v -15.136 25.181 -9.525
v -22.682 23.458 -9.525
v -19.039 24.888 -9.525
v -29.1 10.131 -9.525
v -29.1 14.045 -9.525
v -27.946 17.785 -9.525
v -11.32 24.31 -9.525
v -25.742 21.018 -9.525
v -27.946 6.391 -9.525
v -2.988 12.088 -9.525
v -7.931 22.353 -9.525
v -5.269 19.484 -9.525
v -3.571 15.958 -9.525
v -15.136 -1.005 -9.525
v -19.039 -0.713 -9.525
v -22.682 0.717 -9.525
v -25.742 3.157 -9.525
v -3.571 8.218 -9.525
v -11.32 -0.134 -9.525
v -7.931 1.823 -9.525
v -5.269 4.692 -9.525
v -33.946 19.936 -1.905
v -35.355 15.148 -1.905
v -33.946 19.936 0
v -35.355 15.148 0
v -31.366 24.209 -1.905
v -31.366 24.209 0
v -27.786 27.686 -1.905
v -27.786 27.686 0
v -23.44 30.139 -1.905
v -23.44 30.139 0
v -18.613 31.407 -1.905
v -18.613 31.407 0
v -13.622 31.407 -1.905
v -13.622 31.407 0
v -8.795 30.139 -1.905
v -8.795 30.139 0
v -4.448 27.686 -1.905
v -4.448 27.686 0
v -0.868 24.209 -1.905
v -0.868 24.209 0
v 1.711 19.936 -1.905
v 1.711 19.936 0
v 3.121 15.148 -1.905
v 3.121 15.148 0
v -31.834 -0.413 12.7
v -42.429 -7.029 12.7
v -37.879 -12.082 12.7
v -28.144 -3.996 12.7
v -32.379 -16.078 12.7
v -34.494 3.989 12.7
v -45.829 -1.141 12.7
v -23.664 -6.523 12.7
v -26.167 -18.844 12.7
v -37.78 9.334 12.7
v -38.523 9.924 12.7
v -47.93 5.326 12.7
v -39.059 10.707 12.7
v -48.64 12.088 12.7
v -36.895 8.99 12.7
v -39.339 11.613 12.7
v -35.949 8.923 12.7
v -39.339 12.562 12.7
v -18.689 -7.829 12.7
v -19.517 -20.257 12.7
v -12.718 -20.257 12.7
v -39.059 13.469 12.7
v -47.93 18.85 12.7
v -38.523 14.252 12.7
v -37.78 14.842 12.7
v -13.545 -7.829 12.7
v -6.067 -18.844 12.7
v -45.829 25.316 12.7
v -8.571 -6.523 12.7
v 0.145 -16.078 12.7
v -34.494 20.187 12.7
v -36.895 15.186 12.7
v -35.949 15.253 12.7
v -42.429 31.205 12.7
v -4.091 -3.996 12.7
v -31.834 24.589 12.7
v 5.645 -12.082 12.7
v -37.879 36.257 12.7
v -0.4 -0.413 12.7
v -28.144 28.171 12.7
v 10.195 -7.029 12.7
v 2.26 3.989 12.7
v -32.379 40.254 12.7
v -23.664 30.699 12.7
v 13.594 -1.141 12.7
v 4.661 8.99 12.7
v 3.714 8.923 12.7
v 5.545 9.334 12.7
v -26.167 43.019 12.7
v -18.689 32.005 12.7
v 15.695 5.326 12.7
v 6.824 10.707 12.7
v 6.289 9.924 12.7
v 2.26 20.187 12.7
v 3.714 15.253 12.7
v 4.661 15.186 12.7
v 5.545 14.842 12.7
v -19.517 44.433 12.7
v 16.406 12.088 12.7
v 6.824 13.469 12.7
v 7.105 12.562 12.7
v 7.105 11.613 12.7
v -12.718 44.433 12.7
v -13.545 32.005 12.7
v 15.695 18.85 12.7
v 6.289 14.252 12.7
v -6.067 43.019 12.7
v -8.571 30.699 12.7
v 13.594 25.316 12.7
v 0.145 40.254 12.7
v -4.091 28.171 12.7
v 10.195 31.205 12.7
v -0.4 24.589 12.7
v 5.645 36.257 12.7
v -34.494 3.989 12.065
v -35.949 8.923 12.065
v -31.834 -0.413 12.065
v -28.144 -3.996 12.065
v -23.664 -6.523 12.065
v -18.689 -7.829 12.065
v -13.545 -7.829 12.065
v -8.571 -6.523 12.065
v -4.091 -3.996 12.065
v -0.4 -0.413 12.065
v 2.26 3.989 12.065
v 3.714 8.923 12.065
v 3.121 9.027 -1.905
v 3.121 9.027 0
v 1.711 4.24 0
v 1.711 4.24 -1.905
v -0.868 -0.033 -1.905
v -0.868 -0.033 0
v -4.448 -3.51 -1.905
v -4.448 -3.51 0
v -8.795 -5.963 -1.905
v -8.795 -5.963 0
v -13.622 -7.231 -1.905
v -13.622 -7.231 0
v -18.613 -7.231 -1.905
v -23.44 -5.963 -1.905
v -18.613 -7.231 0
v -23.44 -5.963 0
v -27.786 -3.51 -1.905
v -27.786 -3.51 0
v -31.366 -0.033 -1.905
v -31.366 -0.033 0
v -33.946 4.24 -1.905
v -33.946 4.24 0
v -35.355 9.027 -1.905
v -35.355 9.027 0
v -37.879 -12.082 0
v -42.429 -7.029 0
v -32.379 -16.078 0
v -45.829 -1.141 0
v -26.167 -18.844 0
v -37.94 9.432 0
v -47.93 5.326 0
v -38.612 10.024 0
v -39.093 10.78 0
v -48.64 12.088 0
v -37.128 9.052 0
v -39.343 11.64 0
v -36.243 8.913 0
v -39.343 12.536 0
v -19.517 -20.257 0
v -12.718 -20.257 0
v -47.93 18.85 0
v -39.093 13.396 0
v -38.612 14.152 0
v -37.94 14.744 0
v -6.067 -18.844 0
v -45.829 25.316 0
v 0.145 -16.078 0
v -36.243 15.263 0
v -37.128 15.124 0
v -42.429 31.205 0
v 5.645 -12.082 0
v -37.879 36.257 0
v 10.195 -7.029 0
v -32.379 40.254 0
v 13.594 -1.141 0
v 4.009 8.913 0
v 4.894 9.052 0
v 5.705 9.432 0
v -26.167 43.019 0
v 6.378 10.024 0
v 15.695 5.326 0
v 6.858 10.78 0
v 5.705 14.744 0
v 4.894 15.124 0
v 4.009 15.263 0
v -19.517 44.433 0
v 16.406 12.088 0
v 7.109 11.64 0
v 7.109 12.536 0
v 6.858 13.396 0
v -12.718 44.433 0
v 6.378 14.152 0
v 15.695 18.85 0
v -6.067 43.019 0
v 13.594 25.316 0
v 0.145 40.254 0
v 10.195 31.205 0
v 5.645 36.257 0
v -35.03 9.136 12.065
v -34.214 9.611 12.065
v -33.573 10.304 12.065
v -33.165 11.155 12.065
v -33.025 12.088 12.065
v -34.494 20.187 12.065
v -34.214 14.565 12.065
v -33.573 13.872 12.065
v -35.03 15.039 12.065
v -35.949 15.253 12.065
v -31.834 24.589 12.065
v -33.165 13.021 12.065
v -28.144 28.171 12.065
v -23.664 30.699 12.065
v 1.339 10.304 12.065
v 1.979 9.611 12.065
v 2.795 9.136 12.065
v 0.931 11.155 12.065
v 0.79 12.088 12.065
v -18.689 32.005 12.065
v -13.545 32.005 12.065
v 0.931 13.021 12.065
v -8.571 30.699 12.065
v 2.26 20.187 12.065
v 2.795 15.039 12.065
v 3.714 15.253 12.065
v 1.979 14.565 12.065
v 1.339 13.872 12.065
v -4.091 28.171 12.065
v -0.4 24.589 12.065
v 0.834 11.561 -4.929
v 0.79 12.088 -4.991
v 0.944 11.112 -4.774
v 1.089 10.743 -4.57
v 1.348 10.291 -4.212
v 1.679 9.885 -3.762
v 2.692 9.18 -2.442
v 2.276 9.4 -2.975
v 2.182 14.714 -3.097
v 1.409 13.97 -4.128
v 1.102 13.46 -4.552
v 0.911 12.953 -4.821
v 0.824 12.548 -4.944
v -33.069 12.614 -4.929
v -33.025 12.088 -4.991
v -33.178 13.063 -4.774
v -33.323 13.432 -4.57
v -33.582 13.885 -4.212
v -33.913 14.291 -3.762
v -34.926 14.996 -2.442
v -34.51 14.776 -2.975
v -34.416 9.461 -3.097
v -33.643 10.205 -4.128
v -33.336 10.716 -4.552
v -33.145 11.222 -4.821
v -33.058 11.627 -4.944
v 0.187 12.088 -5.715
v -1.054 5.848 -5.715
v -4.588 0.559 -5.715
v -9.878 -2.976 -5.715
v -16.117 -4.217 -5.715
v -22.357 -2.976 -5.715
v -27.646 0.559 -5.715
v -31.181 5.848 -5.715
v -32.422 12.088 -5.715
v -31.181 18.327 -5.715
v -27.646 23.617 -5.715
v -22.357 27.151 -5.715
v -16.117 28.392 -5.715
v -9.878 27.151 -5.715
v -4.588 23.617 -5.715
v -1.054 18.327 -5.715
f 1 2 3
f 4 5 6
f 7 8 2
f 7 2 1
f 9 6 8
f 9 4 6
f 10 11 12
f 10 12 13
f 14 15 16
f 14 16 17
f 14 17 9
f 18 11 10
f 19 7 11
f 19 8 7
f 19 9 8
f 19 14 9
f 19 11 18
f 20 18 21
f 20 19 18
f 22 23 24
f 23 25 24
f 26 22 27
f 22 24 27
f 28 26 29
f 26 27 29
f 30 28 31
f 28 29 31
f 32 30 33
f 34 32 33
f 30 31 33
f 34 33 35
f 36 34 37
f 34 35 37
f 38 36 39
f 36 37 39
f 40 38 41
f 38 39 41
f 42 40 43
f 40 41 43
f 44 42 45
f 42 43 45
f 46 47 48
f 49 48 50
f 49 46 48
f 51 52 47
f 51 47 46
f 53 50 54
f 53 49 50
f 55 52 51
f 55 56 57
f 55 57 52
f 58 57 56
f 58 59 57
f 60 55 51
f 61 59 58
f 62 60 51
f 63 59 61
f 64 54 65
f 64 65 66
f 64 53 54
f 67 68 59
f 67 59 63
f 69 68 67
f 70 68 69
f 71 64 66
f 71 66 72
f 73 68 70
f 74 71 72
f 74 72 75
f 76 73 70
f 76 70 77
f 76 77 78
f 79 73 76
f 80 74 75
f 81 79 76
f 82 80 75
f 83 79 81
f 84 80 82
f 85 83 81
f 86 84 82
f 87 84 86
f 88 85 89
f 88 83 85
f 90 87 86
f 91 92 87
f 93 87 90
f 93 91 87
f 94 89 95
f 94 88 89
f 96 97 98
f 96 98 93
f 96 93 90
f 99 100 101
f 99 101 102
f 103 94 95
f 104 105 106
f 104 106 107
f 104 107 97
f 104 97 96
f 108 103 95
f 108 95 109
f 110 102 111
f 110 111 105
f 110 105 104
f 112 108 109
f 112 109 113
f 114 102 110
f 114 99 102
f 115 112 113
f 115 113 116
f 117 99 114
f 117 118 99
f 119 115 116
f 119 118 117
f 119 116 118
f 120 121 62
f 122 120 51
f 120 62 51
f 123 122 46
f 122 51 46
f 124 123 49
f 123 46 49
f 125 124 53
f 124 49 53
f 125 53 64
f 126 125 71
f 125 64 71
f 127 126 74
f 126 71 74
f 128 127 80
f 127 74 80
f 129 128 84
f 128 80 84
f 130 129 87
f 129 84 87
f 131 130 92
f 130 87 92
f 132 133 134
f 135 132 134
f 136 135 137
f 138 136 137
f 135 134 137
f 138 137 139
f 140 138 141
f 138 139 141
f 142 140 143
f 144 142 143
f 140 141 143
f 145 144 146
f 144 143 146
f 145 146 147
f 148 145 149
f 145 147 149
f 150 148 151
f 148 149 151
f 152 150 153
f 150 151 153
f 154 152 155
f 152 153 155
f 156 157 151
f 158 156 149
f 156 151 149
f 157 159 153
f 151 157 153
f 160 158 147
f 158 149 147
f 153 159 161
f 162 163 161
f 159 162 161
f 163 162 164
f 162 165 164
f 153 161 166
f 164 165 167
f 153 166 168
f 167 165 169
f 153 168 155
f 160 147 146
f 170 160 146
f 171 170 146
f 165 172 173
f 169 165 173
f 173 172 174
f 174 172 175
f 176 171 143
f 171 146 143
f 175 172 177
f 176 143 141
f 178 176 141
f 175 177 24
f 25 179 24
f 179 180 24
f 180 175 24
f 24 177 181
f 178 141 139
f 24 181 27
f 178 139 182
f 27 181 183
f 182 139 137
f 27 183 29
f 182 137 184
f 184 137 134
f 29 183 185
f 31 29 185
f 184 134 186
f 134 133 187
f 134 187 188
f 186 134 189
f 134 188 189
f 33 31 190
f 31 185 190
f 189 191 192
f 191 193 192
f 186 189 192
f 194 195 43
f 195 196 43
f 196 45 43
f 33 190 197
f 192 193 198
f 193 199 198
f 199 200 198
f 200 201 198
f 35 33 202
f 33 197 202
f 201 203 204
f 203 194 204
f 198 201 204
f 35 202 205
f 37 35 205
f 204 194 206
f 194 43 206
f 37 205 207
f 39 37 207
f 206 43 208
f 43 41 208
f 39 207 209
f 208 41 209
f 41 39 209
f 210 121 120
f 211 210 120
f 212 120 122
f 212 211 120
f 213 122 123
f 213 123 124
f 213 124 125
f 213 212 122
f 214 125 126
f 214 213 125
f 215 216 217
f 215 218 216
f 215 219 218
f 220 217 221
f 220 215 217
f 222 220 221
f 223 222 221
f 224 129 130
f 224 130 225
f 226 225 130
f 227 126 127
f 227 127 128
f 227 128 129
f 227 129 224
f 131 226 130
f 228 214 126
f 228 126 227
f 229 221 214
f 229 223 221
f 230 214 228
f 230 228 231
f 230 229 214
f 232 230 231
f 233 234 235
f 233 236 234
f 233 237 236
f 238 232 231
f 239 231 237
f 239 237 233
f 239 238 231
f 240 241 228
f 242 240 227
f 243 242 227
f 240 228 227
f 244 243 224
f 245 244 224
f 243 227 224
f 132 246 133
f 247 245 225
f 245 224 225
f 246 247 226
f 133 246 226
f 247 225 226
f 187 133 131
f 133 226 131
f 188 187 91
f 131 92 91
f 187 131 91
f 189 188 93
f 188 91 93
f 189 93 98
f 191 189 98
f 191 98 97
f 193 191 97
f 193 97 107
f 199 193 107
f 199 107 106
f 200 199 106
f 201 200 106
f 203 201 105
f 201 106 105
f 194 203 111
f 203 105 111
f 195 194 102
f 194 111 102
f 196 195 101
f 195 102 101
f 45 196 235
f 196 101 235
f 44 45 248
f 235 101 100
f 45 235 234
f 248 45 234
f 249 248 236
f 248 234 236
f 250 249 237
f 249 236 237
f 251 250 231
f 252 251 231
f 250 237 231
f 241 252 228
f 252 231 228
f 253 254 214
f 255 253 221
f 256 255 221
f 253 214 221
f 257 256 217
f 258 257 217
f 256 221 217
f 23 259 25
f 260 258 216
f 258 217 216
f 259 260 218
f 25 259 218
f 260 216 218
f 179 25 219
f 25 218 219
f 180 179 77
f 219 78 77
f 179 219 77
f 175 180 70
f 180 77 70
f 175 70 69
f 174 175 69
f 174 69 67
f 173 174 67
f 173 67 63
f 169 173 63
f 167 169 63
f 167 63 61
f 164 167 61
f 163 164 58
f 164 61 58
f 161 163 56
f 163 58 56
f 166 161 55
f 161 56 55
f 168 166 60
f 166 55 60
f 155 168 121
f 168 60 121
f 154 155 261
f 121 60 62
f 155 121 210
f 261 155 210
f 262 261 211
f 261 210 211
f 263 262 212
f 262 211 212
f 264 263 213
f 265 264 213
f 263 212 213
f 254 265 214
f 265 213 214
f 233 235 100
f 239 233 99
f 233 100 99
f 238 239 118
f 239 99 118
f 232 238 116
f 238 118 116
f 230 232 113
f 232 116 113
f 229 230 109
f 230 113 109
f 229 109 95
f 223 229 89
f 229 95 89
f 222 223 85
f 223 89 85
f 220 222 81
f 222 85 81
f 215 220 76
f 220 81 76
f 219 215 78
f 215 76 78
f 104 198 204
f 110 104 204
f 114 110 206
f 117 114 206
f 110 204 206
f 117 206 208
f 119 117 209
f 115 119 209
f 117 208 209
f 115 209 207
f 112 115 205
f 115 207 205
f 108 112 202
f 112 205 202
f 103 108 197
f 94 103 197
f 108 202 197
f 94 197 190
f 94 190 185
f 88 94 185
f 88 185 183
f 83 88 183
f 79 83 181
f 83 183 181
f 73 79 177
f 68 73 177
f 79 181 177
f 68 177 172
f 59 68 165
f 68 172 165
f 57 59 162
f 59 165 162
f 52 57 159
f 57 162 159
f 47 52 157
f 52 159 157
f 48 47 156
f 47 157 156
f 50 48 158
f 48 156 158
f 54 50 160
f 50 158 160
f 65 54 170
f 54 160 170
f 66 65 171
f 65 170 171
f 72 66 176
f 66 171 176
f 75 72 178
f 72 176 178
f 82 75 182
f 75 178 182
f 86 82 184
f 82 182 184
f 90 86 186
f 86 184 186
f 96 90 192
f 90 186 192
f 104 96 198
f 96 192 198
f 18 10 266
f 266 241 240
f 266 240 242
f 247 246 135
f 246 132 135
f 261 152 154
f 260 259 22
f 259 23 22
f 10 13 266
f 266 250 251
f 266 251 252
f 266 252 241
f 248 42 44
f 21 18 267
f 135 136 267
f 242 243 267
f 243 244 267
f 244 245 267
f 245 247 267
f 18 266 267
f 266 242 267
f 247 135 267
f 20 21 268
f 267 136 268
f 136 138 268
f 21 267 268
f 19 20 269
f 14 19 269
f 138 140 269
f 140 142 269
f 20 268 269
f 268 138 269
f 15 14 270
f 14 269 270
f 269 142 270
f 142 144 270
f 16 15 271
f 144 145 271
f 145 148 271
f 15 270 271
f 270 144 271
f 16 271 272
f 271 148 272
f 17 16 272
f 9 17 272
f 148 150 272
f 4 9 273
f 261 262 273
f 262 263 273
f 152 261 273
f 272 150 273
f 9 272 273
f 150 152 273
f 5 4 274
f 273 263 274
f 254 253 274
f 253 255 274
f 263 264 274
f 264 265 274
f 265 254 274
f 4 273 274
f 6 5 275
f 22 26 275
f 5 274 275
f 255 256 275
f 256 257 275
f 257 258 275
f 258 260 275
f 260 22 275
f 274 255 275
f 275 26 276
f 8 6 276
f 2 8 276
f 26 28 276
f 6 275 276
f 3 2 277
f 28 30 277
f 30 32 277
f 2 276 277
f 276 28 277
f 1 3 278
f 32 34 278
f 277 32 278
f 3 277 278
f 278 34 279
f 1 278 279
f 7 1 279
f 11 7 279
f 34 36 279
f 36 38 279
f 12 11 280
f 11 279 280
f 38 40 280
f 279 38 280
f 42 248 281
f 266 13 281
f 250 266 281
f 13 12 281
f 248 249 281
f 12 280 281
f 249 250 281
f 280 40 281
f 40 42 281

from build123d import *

# Parameters (mm, degrees)
F0_R     = 32.5233232703
F1_DEPTH = 12.7
F2_R     = 19.4795835543
F3_DEPTH = 9.525
F4_SIZE2 = 7.62
F4_SIZE  = 6.35
F5_R     = 20.082572942
F6_DEPTH = 0.635
F8_DEPTH = 21.591
F9_DEPTH = 19.304


with BuildPart() as f1:
    # F0 (on Top) → F1 (new body)
    with BuildSketch(Plane.XY):
        with Locations((-16.1171220243, 12.0878415182)):
            Circle(F0_R)
    extrude(amount=F1_DEPTH)

    # F2 (on face) → F3 (join)
    with BuildSketch(Plane(origin=(0, 0, 0), x_dir=(1, 0, 0), z_dir=(0, 0, -1))):
        with Locations((-16.1171220243, -12.0878415182)):
            Circle(F2_R)
    extrude(amount=F3_DEPTH)

    # F4
    f4_edges = [f1.edges().sort_by_distance(p)[0] for p in [
        (-35.596706, 12.087842, -9.525),
    ]]
    f4_side = f1.faces().sort_by_distance((-16.117122, 12.087842, -9.525))[0]
    chamfer(f4_edges, length=F4_SIZE, length2=F4_SIZE2, reference=f4_side)

    # F5 (on face) → F6 (cut)
    with BuildSketch(Plane.XY.offset(12.7)):
        with Locations((-16.1171220243, 12.0878415182)):
            Circle(F5_R)
    extrude(amount=-F6_DEPTH, mode=Mode.SUBTRACT)

    # F7 (on face) → F8 (cut, through all)
    with BuildSketch(Plane.XY.offset(12.065)):
        with BuildLine():
            ThreePointArc((-39.3746949662, 12.0878415182), (-36.1996949662, 8.9128415182), (-33.0246949662, 12.0878415182))
            Line((-33.0246949662, 12.0878415182), (-39.3746949662, 12.0878415182))
        make_face()
        with BuildLine():
            Line((-39.3746949662, 12.0878415182), (-33.0246949662, 12.0878415182))
            ThreePointArc((-33.0246949662, 12.0878415182), (-36.1996949662, 15.2628415182), (-39.3746949662, 12.0878415182))
        make_face()
        with BuildLine():
            ThreePointArc((7.1404509177, 12.0878415182), (3.9654509177, 15.2628415182), (0.7904509177, 12.0878415182))
            Line((0.7904509177, 12.0878415182), (7.1404509177, 12.0878415182))
        make_face()
        with BuildLine():
            Line((7.1404509177, 12.0878415182), (0.7904509177, 12.0878415182))
            ThreePointArc((0.7904509177, 12.0878415182), (3.9654509177, 8.9128415182), (7.1404509177, 12.0878415182))
        make_face()
    extrude(amount=-F8_DEPTH, mode=Mode.SUBTRACT)

    # F7 (on face) → F9 (cut)
    with BuildSketch(Plane.XY.offset(12.065)):
        with BuildLine():
            ThreePointArc((-39.3746949662, 12.0878415182), (-36.1996949662, 8.9128415182), (-33.0246949662, 12.0878415182))
            Line((-33.0246949662, 12.0878415182), (-39.3746949662, 12.0878415182))
        make_face()
        with BuildLine():
            Line((-39.3746949662, 12.0878415182), (-33.0246949662, 12.0878415182))
            ThreePointArc((-33.0246949662, 12.0878415182), (-36.1996949662, 15.2628415182), (-39.3746949662, 12.0878415182))
        make_face()
        with BuildLine():
            ThreePointArc((7.1404509177, 12.0878415182), (3.9654509177, 15.2628415182), (0.7904509177, 12.0878415182))
            Line((0.7904509177, 12.0878415182), (7.1404509177, 12.0878415182))
        make_face()
        with BuildLine():
            Line((7.1404509177, 12.0878415182), (0.7904509177, 12.0878415182))
            ThreePointArc((0.7904509177, 12.0878415182), (3.9654509177, 8.9128415182), (7.1404509177, 12.0878415182))
        make_face()
    extrude(amount=F9_DEPTH, mode=Mode.SUBTRACT)


solid = f1.part
